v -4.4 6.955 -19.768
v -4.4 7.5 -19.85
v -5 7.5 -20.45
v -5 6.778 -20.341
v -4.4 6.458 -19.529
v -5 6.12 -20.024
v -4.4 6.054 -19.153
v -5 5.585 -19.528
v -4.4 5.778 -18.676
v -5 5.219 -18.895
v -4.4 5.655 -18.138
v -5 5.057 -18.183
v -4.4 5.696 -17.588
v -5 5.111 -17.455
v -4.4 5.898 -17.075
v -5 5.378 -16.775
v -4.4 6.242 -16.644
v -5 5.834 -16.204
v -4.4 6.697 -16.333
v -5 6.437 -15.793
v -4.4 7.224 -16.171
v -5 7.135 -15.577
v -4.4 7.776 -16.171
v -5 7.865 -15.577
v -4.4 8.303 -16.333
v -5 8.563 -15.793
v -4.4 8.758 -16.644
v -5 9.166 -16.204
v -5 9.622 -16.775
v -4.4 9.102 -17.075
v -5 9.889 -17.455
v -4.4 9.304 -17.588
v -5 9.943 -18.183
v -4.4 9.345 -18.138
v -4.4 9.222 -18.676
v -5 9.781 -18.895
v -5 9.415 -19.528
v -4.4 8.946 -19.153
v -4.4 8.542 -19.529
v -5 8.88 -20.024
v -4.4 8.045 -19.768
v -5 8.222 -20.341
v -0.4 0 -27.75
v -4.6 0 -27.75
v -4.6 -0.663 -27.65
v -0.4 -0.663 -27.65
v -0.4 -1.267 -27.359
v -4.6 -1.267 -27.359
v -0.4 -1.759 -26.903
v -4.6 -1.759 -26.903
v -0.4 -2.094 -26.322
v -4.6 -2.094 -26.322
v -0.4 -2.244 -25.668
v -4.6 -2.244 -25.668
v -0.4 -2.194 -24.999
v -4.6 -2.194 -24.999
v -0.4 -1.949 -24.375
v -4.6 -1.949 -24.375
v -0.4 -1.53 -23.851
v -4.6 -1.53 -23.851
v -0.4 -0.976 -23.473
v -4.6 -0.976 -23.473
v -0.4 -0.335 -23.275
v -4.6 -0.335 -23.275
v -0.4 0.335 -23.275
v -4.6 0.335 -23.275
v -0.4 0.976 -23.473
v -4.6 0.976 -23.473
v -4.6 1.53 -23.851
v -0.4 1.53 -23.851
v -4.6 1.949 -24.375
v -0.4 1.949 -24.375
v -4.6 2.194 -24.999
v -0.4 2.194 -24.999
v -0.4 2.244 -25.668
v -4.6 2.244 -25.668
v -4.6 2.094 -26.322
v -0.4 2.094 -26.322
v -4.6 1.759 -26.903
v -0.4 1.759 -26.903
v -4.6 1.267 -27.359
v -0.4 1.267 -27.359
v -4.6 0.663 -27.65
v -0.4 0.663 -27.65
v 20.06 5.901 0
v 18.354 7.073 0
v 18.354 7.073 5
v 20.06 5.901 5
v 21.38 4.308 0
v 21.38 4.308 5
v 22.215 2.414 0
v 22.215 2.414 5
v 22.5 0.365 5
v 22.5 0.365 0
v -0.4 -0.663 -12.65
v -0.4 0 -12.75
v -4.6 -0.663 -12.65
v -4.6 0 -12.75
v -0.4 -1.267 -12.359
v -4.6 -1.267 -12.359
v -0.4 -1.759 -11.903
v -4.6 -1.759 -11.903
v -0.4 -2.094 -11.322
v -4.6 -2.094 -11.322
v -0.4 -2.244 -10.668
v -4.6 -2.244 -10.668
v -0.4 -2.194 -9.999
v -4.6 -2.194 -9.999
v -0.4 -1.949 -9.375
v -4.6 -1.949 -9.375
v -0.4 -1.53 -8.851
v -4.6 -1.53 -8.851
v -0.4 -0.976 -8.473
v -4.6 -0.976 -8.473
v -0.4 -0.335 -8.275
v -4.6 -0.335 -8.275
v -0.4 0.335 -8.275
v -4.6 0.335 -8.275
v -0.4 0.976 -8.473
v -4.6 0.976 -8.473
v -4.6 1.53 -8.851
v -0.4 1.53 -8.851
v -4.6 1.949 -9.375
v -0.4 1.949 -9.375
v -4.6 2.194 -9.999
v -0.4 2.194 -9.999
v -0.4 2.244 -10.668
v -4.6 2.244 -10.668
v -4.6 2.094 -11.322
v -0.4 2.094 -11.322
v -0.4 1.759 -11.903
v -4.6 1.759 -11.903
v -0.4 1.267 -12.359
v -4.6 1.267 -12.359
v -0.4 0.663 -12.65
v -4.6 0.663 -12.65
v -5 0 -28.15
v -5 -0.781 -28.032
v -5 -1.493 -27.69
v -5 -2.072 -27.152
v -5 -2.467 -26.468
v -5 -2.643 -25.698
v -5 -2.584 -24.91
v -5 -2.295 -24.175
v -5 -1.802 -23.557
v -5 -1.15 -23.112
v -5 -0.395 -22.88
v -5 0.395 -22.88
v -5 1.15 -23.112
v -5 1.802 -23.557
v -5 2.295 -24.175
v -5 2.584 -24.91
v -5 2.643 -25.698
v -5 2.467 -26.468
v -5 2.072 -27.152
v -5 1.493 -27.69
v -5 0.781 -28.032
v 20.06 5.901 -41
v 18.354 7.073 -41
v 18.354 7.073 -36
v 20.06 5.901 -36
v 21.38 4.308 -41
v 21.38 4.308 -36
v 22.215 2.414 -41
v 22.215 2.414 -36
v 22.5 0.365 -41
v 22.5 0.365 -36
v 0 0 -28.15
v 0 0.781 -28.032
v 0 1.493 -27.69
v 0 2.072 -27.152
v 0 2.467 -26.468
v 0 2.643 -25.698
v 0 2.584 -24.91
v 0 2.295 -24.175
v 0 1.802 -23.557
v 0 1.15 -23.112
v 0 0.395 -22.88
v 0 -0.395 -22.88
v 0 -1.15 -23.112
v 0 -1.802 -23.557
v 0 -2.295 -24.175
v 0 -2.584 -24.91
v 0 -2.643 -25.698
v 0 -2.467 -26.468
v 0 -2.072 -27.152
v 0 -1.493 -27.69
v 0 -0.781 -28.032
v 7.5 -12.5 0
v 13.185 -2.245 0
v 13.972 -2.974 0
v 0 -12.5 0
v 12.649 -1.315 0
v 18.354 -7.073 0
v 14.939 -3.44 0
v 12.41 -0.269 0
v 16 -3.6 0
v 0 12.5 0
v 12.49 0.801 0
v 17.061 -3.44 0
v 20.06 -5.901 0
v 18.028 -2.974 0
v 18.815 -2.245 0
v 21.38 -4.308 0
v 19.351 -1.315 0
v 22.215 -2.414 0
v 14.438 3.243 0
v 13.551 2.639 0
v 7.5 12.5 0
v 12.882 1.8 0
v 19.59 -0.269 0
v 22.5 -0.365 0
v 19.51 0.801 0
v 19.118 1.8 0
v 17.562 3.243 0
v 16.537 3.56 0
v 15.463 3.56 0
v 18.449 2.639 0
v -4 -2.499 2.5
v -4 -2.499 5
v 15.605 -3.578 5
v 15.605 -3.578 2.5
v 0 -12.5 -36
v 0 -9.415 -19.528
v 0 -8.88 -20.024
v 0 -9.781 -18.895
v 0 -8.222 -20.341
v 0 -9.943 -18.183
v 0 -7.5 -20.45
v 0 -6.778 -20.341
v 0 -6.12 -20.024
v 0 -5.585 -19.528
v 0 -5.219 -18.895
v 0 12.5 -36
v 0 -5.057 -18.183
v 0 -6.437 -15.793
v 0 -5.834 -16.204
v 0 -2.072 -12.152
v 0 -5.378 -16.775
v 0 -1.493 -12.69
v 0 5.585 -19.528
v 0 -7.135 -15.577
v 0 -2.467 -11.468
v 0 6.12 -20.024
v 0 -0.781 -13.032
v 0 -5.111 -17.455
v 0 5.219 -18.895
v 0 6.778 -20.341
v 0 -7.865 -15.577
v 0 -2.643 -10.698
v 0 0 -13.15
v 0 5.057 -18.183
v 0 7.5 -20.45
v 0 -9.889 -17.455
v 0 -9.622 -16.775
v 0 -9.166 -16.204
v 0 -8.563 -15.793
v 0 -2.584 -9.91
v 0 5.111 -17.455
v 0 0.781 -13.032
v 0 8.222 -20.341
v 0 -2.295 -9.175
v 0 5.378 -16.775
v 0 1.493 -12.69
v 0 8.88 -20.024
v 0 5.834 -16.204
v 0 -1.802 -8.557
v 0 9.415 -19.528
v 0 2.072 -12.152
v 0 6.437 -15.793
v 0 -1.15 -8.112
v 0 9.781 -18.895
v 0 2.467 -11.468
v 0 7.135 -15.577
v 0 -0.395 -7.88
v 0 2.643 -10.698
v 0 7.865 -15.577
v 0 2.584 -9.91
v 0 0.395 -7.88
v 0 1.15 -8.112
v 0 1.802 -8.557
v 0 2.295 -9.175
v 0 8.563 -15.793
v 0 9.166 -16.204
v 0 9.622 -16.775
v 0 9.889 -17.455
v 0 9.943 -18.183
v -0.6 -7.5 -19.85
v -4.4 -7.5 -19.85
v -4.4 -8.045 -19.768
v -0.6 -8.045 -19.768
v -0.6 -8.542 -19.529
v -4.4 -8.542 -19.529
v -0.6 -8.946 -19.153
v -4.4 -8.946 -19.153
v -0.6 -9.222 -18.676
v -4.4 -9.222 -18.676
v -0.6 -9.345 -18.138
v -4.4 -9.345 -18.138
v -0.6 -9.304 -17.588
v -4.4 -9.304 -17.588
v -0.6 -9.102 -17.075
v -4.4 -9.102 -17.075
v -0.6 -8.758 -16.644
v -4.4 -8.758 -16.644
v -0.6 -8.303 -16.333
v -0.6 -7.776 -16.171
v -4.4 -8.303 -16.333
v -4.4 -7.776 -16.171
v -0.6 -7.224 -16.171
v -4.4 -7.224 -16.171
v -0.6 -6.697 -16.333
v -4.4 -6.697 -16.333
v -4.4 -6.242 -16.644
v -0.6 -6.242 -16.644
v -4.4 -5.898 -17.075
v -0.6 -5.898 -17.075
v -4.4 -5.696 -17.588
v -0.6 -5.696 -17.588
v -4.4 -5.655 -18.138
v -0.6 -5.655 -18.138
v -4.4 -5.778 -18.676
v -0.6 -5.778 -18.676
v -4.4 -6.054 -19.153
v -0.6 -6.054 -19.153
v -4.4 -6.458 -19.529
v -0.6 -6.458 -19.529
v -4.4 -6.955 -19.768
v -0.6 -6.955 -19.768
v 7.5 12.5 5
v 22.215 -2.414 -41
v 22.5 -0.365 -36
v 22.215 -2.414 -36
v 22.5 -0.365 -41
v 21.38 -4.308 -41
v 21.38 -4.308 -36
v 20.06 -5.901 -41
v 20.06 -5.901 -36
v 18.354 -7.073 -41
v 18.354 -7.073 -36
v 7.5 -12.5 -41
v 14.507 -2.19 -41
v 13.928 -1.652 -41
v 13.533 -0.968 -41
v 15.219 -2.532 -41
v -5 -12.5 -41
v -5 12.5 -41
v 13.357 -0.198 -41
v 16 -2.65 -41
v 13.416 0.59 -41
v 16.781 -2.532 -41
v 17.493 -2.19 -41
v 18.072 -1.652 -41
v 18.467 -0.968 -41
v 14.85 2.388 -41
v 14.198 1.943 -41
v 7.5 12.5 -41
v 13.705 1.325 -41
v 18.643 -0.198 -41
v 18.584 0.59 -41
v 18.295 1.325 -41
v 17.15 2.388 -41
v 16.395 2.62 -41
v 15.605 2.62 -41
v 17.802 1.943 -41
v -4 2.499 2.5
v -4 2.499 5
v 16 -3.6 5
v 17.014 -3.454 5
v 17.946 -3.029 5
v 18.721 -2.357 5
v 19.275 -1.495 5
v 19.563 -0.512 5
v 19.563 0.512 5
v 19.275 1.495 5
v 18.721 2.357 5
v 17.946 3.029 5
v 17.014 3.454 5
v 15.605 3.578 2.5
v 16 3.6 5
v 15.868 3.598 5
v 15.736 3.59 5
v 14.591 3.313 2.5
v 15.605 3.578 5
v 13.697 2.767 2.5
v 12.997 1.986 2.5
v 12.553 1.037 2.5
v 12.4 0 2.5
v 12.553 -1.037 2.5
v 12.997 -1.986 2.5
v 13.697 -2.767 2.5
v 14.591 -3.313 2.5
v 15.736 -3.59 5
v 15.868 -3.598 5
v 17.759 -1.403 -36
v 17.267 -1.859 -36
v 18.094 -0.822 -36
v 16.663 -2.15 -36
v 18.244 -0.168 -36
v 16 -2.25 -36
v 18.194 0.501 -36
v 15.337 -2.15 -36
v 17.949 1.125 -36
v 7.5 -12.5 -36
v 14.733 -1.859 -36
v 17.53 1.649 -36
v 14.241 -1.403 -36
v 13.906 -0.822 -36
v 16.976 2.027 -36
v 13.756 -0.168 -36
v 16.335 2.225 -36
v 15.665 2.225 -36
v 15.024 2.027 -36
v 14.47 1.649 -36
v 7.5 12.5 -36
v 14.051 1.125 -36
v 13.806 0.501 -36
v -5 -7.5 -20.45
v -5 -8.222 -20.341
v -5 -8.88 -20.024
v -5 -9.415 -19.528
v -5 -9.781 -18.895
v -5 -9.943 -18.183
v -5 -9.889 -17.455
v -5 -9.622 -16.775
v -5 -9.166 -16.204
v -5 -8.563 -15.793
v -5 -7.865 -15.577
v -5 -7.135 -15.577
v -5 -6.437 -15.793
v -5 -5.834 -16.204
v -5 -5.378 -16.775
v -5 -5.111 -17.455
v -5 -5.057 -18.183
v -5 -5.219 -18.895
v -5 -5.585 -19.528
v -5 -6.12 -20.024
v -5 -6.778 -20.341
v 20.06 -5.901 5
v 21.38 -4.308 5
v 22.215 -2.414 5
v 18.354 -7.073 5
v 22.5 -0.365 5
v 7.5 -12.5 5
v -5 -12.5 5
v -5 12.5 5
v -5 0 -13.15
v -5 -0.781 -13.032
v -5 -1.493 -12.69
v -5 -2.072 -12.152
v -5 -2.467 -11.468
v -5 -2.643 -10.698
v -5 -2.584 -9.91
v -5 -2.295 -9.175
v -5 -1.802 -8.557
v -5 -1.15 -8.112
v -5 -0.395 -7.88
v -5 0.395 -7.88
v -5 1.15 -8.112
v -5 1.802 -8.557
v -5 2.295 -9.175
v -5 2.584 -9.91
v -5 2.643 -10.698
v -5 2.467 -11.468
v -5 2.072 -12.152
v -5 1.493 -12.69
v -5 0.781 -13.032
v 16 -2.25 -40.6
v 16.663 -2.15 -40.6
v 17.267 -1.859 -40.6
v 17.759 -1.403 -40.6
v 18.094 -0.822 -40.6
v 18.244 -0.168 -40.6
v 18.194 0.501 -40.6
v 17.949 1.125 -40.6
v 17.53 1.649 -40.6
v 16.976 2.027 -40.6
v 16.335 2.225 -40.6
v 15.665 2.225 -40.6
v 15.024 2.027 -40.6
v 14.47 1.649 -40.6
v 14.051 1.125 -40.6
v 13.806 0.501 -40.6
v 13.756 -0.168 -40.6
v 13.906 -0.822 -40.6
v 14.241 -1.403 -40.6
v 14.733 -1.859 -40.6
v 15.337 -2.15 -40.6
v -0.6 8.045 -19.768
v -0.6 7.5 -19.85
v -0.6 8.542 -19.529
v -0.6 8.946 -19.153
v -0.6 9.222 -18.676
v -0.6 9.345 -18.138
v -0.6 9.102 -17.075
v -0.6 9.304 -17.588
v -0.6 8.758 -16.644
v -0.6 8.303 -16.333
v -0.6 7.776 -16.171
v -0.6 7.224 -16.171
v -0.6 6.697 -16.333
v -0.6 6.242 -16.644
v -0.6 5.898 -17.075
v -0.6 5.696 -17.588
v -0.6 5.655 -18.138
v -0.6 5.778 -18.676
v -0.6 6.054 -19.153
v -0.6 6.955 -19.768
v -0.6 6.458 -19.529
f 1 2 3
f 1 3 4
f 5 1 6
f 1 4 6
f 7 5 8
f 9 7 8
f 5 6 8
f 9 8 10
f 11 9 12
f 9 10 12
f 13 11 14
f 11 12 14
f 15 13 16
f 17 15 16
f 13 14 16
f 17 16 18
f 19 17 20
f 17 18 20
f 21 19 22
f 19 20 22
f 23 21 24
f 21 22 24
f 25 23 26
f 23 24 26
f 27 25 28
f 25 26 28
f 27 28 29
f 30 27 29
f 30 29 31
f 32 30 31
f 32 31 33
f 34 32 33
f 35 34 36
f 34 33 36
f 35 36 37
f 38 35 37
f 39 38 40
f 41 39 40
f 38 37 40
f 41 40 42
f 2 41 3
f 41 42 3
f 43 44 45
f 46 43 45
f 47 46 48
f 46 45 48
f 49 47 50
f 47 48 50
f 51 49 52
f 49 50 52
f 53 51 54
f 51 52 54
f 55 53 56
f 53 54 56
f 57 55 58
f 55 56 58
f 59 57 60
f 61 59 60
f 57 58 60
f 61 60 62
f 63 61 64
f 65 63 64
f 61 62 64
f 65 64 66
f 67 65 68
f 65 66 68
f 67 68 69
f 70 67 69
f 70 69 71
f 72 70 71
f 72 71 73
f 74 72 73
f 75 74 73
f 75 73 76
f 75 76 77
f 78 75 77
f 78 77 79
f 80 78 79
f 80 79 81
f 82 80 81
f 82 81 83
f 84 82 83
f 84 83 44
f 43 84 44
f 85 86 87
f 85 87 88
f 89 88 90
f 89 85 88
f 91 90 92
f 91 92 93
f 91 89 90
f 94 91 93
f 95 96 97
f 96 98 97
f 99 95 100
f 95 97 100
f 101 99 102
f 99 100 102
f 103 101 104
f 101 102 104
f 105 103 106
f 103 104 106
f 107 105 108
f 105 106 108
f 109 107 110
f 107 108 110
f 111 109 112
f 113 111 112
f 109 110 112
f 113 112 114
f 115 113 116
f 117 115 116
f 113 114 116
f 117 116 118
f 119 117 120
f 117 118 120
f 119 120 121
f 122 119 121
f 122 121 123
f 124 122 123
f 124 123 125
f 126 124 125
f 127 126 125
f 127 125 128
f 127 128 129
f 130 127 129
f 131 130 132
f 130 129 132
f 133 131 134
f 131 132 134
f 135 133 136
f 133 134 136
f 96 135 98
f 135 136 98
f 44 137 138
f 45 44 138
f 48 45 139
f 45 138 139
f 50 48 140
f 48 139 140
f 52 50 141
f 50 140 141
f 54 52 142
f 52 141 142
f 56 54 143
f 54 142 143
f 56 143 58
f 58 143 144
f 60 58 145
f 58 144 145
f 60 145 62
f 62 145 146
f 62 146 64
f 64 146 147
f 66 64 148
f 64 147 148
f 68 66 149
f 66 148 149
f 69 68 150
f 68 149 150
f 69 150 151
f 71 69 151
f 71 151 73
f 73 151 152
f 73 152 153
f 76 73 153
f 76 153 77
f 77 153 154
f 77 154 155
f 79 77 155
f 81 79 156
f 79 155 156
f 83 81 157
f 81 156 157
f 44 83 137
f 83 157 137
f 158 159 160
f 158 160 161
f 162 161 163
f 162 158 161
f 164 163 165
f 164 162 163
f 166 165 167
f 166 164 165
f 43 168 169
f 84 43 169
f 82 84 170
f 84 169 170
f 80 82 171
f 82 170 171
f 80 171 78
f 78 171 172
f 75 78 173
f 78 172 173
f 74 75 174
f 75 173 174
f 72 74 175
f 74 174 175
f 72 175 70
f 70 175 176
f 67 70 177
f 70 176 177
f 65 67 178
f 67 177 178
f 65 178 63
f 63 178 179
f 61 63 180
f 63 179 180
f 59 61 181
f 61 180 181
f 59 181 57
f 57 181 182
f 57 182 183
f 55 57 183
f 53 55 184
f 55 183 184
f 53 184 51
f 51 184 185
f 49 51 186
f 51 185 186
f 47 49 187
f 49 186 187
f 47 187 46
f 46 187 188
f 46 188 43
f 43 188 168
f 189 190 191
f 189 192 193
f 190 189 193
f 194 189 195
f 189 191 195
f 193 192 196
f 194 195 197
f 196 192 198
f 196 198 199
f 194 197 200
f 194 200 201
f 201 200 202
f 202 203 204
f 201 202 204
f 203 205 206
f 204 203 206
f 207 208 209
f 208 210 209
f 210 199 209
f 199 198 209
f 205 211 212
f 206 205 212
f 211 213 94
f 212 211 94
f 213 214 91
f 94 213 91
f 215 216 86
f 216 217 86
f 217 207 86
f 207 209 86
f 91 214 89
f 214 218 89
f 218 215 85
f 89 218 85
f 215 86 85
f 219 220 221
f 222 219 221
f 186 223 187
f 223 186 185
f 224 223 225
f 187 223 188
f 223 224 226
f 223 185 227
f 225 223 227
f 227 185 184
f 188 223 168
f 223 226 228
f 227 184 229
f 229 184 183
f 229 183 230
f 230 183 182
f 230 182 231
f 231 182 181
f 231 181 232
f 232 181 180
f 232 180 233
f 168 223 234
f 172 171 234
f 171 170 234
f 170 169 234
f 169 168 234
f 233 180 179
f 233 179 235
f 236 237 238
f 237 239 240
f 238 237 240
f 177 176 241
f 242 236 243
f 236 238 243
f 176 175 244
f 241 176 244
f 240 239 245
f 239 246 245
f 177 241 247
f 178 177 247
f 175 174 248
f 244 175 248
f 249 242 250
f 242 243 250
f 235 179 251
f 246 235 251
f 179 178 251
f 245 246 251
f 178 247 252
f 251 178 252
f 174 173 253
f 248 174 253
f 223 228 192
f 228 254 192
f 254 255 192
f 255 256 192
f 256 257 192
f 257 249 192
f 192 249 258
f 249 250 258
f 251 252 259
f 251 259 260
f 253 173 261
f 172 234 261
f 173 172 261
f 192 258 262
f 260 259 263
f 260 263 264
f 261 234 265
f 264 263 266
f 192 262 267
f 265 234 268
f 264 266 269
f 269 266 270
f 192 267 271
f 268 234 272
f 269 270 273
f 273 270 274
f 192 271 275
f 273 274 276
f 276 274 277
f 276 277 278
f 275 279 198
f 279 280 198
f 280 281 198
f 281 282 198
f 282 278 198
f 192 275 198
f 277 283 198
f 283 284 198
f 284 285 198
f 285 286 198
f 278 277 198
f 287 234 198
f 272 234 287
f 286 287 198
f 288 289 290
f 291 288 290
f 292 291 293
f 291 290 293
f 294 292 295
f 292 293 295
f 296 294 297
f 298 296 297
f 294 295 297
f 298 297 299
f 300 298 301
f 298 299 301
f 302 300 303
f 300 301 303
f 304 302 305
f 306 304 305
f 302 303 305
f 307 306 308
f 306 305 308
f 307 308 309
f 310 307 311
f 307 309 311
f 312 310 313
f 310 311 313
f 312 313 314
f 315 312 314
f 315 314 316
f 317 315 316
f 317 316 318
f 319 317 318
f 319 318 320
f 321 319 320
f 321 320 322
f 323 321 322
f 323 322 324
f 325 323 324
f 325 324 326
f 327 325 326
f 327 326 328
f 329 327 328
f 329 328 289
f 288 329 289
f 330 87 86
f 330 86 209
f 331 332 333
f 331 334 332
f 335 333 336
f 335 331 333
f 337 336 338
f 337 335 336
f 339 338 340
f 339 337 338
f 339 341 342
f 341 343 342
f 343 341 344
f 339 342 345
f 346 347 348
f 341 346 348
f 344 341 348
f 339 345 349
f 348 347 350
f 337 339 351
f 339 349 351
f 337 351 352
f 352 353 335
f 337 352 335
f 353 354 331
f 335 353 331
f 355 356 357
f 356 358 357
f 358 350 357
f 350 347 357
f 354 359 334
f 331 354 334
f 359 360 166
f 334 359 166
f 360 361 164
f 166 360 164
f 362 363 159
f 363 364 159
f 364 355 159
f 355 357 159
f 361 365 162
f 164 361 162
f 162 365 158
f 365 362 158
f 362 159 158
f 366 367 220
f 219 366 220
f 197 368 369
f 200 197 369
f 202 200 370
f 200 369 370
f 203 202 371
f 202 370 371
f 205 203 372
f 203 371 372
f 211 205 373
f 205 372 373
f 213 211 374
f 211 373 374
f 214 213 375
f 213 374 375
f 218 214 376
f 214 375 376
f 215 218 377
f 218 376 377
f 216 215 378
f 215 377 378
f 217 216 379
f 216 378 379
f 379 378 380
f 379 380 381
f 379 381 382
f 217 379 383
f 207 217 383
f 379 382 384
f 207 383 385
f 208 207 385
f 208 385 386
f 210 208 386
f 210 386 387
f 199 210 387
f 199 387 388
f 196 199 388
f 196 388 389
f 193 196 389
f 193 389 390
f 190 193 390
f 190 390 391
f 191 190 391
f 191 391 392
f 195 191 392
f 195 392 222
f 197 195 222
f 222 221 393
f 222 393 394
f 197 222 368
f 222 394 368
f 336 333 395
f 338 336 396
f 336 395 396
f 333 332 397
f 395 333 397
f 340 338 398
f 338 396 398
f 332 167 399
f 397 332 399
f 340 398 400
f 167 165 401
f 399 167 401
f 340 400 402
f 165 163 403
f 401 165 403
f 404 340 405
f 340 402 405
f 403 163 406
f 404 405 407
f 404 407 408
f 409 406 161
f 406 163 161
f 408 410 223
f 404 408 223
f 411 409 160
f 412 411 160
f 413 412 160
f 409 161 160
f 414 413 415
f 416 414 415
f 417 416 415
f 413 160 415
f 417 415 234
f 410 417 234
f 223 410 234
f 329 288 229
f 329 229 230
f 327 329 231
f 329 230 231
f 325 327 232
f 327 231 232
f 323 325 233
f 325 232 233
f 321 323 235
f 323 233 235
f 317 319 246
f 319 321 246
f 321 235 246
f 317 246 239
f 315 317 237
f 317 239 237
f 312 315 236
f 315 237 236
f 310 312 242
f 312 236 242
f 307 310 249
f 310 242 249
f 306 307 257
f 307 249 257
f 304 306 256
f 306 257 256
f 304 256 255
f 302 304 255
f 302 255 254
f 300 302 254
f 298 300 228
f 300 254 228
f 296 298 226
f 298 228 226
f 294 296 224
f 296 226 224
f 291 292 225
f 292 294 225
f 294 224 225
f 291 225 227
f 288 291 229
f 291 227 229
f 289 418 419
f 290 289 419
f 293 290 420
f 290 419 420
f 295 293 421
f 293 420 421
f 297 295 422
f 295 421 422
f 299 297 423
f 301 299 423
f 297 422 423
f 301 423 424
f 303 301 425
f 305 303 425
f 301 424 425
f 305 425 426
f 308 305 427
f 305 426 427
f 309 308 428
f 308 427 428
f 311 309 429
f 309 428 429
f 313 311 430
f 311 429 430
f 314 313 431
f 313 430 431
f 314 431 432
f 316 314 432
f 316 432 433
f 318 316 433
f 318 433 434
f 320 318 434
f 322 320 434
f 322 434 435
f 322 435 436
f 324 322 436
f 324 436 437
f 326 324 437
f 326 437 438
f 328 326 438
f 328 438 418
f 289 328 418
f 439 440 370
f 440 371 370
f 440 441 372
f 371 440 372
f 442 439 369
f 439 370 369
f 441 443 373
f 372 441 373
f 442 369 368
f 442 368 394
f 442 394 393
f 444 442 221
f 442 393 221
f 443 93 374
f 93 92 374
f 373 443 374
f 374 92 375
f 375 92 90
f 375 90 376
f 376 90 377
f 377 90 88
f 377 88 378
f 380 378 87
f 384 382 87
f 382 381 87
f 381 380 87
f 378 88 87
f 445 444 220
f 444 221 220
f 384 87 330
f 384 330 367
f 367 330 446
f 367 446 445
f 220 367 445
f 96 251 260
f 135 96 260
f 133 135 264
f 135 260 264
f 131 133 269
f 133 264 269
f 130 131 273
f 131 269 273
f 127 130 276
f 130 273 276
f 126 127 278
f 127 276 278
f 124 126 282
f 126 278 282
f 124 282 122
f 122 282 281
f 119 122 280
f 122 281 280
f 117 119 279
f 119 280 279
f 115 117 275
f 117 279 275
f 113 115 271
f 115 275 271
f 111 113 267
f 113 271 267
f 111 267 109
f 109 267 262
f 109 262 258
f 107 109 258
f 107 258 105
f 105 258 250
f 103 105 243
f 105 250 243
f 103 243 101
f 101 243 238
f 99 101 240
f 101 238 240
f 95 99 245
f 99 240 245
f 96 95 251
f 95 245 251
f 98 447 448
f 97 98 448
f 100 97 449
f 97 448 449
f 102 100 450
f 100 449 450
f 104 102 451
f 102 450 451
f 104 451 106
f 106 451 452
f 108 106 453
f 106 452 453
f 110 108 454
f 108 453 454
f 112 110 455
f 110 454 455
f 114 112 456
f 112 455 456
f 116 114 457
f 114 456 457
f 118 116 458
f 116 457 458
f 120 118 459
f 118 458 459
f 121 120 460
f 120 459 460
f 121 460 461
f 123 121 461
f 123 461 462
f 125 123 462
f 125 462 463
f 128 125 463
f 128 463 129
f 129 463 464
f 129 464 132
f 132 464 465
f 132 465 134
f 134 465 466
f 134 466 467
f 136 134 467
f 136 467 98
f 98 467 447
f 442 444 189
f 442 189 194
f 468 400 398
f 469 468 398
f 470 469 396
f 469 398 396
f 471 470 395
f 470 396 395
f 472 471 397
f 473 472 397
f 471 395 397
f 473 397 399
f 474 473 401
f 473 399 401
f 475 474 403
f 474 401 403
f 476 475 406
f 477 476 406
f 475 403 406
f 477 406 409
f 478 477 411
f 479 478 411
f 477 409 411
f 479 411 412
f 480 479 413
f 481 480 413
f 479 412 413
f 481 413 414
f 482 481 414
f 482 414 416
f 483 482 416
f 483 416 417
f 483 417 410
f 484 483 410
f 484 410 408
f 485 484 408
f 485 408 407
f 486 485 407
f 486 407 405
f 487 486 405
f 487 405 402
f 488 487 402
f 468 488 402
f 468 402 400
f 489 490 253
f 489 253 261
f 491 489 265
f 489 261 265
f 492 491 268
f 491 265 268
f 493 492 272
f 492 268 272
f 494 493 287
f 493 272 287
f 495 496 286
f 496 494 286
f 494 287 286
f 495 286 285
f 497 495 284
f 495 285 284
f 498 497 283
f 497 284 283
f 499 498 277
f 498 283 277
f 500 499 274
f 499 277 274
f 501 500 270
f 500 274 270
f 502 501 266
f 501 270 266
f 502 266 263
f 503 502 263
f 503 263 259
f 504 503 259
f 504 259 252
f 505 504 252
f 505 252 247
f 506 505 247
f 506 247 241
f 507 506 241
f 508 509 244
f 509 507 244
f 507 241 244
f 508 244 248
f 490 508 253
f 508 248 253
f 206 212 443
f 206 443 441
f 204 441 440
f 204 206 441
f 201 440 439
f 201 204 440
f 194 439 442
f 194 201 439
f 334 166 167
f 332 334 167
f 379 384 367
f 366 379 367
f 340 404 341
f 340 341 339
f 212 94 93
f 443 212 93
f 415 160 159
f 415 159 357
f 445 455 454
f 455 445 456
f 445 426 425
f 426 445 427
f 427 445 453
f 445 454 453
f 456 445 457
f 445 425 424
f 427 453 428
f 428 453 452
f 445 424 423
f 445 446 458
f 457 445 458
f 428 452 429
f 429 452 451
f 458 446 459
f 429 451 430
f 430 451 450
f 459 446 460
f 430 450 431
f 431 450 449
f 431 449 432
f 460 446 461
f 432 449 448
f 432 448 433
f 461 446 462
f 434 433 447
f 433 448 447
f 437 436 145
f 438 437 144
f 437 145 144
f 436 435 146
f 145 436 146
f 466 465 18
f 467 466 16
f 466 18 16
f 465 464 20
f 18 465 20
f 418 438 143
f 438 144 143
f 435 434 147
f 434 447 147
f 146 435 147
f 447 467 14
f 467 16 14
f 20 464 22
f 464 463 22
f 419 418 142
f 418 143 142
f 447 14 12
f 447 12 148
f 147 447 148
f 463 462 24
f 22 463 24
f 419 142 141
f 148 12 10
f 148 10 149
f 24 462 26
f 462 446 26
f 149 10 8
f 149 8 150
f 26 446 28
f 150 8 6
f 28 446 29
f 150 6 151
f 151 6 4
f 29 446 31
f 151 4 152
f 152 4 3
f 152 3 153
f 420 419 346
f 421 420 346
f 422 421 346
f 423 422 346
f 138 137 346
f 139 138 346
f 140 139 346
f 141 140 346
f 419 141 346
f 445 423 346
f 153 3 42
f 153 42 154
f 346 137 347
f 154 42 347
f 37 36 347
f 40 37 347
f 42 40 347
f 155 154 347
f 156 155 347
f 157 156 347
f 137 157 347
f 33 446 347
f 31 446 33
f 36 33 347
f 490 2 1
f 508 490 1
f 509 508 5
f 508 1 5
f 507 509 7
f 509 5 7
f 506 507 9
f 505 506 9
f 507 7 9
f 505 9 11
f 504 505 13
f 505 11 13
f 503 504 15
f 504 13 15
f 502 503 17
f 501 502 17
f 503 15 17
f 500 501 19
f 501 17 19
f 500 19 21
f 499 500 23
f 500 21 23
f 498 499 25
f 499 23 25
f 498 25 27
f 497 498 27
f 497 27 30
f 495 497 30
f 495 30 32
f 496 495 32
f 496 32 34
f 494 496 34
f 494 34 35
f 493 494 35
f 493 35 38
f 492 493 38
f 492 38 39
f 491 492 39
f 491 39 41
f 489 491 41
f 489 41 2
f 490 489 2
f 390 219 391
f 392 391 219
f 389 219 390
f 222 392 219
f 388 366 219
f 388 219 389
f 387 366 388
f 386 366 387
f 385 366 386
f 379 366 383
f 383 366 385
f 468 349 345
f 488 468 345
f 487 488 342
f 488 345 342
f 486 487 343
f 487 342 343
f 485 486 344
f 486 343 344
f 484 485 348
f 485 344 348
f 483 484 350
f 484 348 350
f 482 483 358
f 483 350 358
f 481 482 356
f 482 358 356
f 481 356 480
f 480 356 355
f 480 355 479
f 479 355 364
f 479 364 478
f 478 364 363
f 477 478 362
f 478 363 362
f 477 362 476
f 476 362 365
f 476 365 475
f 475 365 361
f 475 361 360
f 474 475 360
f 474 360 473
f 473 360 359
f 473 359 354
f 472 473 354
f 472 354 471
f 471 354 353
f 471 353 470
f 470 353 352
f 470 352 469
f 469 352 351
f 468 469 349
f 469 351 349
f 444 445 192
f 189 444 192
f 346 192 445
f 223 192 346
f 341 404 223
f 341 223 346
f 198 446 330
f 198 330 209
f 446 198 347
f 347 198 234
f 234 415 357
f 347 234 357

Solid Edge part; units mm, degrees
sketch "Sketch1" plane through (0, 0, 0) normal (0, -1, 0) x (1, 0, 0)
  line L0 (0, 0) -> (22.5, 0)
  line L1 (22.5, 0) -> (22.5, 5)
  line L2 (22.5, 5) -> (-5, 5)
  line L3 (-5, 5) -> (-5, -41)
  line L4 (-5, -41) -> (22.5, -41)
  line L5 (22.5, -41) -> (22.5, -36)
  line L6 (22.5, -36) -> (0, -36)
  line L7 (0, -36) -> (0, 0)
  dimension "D1" = 27.5
  dimension "D2" = 22.5
  dimension "D3" = 5
  dimension "D4" = 5
  dimension "D5" = 36
extrude "Protrusion1" add sketch "Sketch1" along normal mid plane 25
sketch "Sketch2" plane through (7.5, 0, 5) normal (0, 0, 1) x (0, 1, 0)
  line L0 (-12.5, 0) -> (-5, -15)
  line L1 (-5, -15) -> (5, -15)
  line L2 (5, -15) -> (12.5, 0)
  line L3 (12.5, 0) -> (12.5, -17.5)
  line L4 (12.5, -17.5) -> (-12.5, -17.5)
  line L5 (-12.5, -17.5) -> (-12.5, 0)
  dimension "D1" = 15
  dimension "D2" = 10
  dimension "D3" = 2.5
extrude "Cutout1" cut sketch "Sketch2" against normal through all
fillet "Round_2" radius 7.5 4 edges at (22.5, -5, 2.5) (22.5, 5, 2.5) (22.5, -5, -38.5) (22.5, 5, -38.5)
hole "Hole_2" at (16, 0, 5) direction (0, 0, -1) diameter 4.5 end through all start chamfer 0.4 start chamfer angle 45 end chamfer 0.4 end chamfer angle 45
hole "Hole_3" at (16, 0, 5) direction (0, 0, -1) diameter 7.2 end up to next
sketch "Sketch3" plane through (7.5, 0, 5) normal (0, 0, 1) x (0, 1, 0)
  line L0 (-3.6, -8.5) -> (3.6, -8.5)
  line L1 (3.6, -8.5) -> (2.4993, 11.5)
  line L2 (2.4993, 11.5) -> (-2.4993, 11.5)
  line L3 (-2.4993, 11.5) -> (-3.6, -8.5)
  dimension "D1" = 20
extrude "ExtrudedCutout_2" cut sketch "Sketch3" against normal blind 2.5
hole "Hole1" at (0, 0, -25.5) direction (-1, 0, 0) diameter 4.5 depth 30 tip angle 118 start chamfer 0.4 start chamfer angle 45 end chamfer 0.4 end chamfer angle 45
hole "Hole2" at (0, 0, -10.5) direction (-1, 0, 0) diameter 4.5 depth 30 tip angle 118 start chamfer 0.4 start chamfer angle 45 end chamfer 0.4 end chamfer angle 45
hole "Hole_8" at (0, -7.5, -18) direction (-1, 0, 0) diameter 3.7 depth 30 tip angle 118 start chamfer 0.6 start chamfer angle 45 end chamfer 0.6 end chamfer angle 45
hole "Hole3" at (0, 7.5, -18) direction (-1, 0, 0) diameter 3.7 depth 30 tip angle 118 start chamfer 0.6 start chamfer angle 45 end chamfer 0.6 end chamfer angle 45
properties material "Polypropylene, general purpose"
